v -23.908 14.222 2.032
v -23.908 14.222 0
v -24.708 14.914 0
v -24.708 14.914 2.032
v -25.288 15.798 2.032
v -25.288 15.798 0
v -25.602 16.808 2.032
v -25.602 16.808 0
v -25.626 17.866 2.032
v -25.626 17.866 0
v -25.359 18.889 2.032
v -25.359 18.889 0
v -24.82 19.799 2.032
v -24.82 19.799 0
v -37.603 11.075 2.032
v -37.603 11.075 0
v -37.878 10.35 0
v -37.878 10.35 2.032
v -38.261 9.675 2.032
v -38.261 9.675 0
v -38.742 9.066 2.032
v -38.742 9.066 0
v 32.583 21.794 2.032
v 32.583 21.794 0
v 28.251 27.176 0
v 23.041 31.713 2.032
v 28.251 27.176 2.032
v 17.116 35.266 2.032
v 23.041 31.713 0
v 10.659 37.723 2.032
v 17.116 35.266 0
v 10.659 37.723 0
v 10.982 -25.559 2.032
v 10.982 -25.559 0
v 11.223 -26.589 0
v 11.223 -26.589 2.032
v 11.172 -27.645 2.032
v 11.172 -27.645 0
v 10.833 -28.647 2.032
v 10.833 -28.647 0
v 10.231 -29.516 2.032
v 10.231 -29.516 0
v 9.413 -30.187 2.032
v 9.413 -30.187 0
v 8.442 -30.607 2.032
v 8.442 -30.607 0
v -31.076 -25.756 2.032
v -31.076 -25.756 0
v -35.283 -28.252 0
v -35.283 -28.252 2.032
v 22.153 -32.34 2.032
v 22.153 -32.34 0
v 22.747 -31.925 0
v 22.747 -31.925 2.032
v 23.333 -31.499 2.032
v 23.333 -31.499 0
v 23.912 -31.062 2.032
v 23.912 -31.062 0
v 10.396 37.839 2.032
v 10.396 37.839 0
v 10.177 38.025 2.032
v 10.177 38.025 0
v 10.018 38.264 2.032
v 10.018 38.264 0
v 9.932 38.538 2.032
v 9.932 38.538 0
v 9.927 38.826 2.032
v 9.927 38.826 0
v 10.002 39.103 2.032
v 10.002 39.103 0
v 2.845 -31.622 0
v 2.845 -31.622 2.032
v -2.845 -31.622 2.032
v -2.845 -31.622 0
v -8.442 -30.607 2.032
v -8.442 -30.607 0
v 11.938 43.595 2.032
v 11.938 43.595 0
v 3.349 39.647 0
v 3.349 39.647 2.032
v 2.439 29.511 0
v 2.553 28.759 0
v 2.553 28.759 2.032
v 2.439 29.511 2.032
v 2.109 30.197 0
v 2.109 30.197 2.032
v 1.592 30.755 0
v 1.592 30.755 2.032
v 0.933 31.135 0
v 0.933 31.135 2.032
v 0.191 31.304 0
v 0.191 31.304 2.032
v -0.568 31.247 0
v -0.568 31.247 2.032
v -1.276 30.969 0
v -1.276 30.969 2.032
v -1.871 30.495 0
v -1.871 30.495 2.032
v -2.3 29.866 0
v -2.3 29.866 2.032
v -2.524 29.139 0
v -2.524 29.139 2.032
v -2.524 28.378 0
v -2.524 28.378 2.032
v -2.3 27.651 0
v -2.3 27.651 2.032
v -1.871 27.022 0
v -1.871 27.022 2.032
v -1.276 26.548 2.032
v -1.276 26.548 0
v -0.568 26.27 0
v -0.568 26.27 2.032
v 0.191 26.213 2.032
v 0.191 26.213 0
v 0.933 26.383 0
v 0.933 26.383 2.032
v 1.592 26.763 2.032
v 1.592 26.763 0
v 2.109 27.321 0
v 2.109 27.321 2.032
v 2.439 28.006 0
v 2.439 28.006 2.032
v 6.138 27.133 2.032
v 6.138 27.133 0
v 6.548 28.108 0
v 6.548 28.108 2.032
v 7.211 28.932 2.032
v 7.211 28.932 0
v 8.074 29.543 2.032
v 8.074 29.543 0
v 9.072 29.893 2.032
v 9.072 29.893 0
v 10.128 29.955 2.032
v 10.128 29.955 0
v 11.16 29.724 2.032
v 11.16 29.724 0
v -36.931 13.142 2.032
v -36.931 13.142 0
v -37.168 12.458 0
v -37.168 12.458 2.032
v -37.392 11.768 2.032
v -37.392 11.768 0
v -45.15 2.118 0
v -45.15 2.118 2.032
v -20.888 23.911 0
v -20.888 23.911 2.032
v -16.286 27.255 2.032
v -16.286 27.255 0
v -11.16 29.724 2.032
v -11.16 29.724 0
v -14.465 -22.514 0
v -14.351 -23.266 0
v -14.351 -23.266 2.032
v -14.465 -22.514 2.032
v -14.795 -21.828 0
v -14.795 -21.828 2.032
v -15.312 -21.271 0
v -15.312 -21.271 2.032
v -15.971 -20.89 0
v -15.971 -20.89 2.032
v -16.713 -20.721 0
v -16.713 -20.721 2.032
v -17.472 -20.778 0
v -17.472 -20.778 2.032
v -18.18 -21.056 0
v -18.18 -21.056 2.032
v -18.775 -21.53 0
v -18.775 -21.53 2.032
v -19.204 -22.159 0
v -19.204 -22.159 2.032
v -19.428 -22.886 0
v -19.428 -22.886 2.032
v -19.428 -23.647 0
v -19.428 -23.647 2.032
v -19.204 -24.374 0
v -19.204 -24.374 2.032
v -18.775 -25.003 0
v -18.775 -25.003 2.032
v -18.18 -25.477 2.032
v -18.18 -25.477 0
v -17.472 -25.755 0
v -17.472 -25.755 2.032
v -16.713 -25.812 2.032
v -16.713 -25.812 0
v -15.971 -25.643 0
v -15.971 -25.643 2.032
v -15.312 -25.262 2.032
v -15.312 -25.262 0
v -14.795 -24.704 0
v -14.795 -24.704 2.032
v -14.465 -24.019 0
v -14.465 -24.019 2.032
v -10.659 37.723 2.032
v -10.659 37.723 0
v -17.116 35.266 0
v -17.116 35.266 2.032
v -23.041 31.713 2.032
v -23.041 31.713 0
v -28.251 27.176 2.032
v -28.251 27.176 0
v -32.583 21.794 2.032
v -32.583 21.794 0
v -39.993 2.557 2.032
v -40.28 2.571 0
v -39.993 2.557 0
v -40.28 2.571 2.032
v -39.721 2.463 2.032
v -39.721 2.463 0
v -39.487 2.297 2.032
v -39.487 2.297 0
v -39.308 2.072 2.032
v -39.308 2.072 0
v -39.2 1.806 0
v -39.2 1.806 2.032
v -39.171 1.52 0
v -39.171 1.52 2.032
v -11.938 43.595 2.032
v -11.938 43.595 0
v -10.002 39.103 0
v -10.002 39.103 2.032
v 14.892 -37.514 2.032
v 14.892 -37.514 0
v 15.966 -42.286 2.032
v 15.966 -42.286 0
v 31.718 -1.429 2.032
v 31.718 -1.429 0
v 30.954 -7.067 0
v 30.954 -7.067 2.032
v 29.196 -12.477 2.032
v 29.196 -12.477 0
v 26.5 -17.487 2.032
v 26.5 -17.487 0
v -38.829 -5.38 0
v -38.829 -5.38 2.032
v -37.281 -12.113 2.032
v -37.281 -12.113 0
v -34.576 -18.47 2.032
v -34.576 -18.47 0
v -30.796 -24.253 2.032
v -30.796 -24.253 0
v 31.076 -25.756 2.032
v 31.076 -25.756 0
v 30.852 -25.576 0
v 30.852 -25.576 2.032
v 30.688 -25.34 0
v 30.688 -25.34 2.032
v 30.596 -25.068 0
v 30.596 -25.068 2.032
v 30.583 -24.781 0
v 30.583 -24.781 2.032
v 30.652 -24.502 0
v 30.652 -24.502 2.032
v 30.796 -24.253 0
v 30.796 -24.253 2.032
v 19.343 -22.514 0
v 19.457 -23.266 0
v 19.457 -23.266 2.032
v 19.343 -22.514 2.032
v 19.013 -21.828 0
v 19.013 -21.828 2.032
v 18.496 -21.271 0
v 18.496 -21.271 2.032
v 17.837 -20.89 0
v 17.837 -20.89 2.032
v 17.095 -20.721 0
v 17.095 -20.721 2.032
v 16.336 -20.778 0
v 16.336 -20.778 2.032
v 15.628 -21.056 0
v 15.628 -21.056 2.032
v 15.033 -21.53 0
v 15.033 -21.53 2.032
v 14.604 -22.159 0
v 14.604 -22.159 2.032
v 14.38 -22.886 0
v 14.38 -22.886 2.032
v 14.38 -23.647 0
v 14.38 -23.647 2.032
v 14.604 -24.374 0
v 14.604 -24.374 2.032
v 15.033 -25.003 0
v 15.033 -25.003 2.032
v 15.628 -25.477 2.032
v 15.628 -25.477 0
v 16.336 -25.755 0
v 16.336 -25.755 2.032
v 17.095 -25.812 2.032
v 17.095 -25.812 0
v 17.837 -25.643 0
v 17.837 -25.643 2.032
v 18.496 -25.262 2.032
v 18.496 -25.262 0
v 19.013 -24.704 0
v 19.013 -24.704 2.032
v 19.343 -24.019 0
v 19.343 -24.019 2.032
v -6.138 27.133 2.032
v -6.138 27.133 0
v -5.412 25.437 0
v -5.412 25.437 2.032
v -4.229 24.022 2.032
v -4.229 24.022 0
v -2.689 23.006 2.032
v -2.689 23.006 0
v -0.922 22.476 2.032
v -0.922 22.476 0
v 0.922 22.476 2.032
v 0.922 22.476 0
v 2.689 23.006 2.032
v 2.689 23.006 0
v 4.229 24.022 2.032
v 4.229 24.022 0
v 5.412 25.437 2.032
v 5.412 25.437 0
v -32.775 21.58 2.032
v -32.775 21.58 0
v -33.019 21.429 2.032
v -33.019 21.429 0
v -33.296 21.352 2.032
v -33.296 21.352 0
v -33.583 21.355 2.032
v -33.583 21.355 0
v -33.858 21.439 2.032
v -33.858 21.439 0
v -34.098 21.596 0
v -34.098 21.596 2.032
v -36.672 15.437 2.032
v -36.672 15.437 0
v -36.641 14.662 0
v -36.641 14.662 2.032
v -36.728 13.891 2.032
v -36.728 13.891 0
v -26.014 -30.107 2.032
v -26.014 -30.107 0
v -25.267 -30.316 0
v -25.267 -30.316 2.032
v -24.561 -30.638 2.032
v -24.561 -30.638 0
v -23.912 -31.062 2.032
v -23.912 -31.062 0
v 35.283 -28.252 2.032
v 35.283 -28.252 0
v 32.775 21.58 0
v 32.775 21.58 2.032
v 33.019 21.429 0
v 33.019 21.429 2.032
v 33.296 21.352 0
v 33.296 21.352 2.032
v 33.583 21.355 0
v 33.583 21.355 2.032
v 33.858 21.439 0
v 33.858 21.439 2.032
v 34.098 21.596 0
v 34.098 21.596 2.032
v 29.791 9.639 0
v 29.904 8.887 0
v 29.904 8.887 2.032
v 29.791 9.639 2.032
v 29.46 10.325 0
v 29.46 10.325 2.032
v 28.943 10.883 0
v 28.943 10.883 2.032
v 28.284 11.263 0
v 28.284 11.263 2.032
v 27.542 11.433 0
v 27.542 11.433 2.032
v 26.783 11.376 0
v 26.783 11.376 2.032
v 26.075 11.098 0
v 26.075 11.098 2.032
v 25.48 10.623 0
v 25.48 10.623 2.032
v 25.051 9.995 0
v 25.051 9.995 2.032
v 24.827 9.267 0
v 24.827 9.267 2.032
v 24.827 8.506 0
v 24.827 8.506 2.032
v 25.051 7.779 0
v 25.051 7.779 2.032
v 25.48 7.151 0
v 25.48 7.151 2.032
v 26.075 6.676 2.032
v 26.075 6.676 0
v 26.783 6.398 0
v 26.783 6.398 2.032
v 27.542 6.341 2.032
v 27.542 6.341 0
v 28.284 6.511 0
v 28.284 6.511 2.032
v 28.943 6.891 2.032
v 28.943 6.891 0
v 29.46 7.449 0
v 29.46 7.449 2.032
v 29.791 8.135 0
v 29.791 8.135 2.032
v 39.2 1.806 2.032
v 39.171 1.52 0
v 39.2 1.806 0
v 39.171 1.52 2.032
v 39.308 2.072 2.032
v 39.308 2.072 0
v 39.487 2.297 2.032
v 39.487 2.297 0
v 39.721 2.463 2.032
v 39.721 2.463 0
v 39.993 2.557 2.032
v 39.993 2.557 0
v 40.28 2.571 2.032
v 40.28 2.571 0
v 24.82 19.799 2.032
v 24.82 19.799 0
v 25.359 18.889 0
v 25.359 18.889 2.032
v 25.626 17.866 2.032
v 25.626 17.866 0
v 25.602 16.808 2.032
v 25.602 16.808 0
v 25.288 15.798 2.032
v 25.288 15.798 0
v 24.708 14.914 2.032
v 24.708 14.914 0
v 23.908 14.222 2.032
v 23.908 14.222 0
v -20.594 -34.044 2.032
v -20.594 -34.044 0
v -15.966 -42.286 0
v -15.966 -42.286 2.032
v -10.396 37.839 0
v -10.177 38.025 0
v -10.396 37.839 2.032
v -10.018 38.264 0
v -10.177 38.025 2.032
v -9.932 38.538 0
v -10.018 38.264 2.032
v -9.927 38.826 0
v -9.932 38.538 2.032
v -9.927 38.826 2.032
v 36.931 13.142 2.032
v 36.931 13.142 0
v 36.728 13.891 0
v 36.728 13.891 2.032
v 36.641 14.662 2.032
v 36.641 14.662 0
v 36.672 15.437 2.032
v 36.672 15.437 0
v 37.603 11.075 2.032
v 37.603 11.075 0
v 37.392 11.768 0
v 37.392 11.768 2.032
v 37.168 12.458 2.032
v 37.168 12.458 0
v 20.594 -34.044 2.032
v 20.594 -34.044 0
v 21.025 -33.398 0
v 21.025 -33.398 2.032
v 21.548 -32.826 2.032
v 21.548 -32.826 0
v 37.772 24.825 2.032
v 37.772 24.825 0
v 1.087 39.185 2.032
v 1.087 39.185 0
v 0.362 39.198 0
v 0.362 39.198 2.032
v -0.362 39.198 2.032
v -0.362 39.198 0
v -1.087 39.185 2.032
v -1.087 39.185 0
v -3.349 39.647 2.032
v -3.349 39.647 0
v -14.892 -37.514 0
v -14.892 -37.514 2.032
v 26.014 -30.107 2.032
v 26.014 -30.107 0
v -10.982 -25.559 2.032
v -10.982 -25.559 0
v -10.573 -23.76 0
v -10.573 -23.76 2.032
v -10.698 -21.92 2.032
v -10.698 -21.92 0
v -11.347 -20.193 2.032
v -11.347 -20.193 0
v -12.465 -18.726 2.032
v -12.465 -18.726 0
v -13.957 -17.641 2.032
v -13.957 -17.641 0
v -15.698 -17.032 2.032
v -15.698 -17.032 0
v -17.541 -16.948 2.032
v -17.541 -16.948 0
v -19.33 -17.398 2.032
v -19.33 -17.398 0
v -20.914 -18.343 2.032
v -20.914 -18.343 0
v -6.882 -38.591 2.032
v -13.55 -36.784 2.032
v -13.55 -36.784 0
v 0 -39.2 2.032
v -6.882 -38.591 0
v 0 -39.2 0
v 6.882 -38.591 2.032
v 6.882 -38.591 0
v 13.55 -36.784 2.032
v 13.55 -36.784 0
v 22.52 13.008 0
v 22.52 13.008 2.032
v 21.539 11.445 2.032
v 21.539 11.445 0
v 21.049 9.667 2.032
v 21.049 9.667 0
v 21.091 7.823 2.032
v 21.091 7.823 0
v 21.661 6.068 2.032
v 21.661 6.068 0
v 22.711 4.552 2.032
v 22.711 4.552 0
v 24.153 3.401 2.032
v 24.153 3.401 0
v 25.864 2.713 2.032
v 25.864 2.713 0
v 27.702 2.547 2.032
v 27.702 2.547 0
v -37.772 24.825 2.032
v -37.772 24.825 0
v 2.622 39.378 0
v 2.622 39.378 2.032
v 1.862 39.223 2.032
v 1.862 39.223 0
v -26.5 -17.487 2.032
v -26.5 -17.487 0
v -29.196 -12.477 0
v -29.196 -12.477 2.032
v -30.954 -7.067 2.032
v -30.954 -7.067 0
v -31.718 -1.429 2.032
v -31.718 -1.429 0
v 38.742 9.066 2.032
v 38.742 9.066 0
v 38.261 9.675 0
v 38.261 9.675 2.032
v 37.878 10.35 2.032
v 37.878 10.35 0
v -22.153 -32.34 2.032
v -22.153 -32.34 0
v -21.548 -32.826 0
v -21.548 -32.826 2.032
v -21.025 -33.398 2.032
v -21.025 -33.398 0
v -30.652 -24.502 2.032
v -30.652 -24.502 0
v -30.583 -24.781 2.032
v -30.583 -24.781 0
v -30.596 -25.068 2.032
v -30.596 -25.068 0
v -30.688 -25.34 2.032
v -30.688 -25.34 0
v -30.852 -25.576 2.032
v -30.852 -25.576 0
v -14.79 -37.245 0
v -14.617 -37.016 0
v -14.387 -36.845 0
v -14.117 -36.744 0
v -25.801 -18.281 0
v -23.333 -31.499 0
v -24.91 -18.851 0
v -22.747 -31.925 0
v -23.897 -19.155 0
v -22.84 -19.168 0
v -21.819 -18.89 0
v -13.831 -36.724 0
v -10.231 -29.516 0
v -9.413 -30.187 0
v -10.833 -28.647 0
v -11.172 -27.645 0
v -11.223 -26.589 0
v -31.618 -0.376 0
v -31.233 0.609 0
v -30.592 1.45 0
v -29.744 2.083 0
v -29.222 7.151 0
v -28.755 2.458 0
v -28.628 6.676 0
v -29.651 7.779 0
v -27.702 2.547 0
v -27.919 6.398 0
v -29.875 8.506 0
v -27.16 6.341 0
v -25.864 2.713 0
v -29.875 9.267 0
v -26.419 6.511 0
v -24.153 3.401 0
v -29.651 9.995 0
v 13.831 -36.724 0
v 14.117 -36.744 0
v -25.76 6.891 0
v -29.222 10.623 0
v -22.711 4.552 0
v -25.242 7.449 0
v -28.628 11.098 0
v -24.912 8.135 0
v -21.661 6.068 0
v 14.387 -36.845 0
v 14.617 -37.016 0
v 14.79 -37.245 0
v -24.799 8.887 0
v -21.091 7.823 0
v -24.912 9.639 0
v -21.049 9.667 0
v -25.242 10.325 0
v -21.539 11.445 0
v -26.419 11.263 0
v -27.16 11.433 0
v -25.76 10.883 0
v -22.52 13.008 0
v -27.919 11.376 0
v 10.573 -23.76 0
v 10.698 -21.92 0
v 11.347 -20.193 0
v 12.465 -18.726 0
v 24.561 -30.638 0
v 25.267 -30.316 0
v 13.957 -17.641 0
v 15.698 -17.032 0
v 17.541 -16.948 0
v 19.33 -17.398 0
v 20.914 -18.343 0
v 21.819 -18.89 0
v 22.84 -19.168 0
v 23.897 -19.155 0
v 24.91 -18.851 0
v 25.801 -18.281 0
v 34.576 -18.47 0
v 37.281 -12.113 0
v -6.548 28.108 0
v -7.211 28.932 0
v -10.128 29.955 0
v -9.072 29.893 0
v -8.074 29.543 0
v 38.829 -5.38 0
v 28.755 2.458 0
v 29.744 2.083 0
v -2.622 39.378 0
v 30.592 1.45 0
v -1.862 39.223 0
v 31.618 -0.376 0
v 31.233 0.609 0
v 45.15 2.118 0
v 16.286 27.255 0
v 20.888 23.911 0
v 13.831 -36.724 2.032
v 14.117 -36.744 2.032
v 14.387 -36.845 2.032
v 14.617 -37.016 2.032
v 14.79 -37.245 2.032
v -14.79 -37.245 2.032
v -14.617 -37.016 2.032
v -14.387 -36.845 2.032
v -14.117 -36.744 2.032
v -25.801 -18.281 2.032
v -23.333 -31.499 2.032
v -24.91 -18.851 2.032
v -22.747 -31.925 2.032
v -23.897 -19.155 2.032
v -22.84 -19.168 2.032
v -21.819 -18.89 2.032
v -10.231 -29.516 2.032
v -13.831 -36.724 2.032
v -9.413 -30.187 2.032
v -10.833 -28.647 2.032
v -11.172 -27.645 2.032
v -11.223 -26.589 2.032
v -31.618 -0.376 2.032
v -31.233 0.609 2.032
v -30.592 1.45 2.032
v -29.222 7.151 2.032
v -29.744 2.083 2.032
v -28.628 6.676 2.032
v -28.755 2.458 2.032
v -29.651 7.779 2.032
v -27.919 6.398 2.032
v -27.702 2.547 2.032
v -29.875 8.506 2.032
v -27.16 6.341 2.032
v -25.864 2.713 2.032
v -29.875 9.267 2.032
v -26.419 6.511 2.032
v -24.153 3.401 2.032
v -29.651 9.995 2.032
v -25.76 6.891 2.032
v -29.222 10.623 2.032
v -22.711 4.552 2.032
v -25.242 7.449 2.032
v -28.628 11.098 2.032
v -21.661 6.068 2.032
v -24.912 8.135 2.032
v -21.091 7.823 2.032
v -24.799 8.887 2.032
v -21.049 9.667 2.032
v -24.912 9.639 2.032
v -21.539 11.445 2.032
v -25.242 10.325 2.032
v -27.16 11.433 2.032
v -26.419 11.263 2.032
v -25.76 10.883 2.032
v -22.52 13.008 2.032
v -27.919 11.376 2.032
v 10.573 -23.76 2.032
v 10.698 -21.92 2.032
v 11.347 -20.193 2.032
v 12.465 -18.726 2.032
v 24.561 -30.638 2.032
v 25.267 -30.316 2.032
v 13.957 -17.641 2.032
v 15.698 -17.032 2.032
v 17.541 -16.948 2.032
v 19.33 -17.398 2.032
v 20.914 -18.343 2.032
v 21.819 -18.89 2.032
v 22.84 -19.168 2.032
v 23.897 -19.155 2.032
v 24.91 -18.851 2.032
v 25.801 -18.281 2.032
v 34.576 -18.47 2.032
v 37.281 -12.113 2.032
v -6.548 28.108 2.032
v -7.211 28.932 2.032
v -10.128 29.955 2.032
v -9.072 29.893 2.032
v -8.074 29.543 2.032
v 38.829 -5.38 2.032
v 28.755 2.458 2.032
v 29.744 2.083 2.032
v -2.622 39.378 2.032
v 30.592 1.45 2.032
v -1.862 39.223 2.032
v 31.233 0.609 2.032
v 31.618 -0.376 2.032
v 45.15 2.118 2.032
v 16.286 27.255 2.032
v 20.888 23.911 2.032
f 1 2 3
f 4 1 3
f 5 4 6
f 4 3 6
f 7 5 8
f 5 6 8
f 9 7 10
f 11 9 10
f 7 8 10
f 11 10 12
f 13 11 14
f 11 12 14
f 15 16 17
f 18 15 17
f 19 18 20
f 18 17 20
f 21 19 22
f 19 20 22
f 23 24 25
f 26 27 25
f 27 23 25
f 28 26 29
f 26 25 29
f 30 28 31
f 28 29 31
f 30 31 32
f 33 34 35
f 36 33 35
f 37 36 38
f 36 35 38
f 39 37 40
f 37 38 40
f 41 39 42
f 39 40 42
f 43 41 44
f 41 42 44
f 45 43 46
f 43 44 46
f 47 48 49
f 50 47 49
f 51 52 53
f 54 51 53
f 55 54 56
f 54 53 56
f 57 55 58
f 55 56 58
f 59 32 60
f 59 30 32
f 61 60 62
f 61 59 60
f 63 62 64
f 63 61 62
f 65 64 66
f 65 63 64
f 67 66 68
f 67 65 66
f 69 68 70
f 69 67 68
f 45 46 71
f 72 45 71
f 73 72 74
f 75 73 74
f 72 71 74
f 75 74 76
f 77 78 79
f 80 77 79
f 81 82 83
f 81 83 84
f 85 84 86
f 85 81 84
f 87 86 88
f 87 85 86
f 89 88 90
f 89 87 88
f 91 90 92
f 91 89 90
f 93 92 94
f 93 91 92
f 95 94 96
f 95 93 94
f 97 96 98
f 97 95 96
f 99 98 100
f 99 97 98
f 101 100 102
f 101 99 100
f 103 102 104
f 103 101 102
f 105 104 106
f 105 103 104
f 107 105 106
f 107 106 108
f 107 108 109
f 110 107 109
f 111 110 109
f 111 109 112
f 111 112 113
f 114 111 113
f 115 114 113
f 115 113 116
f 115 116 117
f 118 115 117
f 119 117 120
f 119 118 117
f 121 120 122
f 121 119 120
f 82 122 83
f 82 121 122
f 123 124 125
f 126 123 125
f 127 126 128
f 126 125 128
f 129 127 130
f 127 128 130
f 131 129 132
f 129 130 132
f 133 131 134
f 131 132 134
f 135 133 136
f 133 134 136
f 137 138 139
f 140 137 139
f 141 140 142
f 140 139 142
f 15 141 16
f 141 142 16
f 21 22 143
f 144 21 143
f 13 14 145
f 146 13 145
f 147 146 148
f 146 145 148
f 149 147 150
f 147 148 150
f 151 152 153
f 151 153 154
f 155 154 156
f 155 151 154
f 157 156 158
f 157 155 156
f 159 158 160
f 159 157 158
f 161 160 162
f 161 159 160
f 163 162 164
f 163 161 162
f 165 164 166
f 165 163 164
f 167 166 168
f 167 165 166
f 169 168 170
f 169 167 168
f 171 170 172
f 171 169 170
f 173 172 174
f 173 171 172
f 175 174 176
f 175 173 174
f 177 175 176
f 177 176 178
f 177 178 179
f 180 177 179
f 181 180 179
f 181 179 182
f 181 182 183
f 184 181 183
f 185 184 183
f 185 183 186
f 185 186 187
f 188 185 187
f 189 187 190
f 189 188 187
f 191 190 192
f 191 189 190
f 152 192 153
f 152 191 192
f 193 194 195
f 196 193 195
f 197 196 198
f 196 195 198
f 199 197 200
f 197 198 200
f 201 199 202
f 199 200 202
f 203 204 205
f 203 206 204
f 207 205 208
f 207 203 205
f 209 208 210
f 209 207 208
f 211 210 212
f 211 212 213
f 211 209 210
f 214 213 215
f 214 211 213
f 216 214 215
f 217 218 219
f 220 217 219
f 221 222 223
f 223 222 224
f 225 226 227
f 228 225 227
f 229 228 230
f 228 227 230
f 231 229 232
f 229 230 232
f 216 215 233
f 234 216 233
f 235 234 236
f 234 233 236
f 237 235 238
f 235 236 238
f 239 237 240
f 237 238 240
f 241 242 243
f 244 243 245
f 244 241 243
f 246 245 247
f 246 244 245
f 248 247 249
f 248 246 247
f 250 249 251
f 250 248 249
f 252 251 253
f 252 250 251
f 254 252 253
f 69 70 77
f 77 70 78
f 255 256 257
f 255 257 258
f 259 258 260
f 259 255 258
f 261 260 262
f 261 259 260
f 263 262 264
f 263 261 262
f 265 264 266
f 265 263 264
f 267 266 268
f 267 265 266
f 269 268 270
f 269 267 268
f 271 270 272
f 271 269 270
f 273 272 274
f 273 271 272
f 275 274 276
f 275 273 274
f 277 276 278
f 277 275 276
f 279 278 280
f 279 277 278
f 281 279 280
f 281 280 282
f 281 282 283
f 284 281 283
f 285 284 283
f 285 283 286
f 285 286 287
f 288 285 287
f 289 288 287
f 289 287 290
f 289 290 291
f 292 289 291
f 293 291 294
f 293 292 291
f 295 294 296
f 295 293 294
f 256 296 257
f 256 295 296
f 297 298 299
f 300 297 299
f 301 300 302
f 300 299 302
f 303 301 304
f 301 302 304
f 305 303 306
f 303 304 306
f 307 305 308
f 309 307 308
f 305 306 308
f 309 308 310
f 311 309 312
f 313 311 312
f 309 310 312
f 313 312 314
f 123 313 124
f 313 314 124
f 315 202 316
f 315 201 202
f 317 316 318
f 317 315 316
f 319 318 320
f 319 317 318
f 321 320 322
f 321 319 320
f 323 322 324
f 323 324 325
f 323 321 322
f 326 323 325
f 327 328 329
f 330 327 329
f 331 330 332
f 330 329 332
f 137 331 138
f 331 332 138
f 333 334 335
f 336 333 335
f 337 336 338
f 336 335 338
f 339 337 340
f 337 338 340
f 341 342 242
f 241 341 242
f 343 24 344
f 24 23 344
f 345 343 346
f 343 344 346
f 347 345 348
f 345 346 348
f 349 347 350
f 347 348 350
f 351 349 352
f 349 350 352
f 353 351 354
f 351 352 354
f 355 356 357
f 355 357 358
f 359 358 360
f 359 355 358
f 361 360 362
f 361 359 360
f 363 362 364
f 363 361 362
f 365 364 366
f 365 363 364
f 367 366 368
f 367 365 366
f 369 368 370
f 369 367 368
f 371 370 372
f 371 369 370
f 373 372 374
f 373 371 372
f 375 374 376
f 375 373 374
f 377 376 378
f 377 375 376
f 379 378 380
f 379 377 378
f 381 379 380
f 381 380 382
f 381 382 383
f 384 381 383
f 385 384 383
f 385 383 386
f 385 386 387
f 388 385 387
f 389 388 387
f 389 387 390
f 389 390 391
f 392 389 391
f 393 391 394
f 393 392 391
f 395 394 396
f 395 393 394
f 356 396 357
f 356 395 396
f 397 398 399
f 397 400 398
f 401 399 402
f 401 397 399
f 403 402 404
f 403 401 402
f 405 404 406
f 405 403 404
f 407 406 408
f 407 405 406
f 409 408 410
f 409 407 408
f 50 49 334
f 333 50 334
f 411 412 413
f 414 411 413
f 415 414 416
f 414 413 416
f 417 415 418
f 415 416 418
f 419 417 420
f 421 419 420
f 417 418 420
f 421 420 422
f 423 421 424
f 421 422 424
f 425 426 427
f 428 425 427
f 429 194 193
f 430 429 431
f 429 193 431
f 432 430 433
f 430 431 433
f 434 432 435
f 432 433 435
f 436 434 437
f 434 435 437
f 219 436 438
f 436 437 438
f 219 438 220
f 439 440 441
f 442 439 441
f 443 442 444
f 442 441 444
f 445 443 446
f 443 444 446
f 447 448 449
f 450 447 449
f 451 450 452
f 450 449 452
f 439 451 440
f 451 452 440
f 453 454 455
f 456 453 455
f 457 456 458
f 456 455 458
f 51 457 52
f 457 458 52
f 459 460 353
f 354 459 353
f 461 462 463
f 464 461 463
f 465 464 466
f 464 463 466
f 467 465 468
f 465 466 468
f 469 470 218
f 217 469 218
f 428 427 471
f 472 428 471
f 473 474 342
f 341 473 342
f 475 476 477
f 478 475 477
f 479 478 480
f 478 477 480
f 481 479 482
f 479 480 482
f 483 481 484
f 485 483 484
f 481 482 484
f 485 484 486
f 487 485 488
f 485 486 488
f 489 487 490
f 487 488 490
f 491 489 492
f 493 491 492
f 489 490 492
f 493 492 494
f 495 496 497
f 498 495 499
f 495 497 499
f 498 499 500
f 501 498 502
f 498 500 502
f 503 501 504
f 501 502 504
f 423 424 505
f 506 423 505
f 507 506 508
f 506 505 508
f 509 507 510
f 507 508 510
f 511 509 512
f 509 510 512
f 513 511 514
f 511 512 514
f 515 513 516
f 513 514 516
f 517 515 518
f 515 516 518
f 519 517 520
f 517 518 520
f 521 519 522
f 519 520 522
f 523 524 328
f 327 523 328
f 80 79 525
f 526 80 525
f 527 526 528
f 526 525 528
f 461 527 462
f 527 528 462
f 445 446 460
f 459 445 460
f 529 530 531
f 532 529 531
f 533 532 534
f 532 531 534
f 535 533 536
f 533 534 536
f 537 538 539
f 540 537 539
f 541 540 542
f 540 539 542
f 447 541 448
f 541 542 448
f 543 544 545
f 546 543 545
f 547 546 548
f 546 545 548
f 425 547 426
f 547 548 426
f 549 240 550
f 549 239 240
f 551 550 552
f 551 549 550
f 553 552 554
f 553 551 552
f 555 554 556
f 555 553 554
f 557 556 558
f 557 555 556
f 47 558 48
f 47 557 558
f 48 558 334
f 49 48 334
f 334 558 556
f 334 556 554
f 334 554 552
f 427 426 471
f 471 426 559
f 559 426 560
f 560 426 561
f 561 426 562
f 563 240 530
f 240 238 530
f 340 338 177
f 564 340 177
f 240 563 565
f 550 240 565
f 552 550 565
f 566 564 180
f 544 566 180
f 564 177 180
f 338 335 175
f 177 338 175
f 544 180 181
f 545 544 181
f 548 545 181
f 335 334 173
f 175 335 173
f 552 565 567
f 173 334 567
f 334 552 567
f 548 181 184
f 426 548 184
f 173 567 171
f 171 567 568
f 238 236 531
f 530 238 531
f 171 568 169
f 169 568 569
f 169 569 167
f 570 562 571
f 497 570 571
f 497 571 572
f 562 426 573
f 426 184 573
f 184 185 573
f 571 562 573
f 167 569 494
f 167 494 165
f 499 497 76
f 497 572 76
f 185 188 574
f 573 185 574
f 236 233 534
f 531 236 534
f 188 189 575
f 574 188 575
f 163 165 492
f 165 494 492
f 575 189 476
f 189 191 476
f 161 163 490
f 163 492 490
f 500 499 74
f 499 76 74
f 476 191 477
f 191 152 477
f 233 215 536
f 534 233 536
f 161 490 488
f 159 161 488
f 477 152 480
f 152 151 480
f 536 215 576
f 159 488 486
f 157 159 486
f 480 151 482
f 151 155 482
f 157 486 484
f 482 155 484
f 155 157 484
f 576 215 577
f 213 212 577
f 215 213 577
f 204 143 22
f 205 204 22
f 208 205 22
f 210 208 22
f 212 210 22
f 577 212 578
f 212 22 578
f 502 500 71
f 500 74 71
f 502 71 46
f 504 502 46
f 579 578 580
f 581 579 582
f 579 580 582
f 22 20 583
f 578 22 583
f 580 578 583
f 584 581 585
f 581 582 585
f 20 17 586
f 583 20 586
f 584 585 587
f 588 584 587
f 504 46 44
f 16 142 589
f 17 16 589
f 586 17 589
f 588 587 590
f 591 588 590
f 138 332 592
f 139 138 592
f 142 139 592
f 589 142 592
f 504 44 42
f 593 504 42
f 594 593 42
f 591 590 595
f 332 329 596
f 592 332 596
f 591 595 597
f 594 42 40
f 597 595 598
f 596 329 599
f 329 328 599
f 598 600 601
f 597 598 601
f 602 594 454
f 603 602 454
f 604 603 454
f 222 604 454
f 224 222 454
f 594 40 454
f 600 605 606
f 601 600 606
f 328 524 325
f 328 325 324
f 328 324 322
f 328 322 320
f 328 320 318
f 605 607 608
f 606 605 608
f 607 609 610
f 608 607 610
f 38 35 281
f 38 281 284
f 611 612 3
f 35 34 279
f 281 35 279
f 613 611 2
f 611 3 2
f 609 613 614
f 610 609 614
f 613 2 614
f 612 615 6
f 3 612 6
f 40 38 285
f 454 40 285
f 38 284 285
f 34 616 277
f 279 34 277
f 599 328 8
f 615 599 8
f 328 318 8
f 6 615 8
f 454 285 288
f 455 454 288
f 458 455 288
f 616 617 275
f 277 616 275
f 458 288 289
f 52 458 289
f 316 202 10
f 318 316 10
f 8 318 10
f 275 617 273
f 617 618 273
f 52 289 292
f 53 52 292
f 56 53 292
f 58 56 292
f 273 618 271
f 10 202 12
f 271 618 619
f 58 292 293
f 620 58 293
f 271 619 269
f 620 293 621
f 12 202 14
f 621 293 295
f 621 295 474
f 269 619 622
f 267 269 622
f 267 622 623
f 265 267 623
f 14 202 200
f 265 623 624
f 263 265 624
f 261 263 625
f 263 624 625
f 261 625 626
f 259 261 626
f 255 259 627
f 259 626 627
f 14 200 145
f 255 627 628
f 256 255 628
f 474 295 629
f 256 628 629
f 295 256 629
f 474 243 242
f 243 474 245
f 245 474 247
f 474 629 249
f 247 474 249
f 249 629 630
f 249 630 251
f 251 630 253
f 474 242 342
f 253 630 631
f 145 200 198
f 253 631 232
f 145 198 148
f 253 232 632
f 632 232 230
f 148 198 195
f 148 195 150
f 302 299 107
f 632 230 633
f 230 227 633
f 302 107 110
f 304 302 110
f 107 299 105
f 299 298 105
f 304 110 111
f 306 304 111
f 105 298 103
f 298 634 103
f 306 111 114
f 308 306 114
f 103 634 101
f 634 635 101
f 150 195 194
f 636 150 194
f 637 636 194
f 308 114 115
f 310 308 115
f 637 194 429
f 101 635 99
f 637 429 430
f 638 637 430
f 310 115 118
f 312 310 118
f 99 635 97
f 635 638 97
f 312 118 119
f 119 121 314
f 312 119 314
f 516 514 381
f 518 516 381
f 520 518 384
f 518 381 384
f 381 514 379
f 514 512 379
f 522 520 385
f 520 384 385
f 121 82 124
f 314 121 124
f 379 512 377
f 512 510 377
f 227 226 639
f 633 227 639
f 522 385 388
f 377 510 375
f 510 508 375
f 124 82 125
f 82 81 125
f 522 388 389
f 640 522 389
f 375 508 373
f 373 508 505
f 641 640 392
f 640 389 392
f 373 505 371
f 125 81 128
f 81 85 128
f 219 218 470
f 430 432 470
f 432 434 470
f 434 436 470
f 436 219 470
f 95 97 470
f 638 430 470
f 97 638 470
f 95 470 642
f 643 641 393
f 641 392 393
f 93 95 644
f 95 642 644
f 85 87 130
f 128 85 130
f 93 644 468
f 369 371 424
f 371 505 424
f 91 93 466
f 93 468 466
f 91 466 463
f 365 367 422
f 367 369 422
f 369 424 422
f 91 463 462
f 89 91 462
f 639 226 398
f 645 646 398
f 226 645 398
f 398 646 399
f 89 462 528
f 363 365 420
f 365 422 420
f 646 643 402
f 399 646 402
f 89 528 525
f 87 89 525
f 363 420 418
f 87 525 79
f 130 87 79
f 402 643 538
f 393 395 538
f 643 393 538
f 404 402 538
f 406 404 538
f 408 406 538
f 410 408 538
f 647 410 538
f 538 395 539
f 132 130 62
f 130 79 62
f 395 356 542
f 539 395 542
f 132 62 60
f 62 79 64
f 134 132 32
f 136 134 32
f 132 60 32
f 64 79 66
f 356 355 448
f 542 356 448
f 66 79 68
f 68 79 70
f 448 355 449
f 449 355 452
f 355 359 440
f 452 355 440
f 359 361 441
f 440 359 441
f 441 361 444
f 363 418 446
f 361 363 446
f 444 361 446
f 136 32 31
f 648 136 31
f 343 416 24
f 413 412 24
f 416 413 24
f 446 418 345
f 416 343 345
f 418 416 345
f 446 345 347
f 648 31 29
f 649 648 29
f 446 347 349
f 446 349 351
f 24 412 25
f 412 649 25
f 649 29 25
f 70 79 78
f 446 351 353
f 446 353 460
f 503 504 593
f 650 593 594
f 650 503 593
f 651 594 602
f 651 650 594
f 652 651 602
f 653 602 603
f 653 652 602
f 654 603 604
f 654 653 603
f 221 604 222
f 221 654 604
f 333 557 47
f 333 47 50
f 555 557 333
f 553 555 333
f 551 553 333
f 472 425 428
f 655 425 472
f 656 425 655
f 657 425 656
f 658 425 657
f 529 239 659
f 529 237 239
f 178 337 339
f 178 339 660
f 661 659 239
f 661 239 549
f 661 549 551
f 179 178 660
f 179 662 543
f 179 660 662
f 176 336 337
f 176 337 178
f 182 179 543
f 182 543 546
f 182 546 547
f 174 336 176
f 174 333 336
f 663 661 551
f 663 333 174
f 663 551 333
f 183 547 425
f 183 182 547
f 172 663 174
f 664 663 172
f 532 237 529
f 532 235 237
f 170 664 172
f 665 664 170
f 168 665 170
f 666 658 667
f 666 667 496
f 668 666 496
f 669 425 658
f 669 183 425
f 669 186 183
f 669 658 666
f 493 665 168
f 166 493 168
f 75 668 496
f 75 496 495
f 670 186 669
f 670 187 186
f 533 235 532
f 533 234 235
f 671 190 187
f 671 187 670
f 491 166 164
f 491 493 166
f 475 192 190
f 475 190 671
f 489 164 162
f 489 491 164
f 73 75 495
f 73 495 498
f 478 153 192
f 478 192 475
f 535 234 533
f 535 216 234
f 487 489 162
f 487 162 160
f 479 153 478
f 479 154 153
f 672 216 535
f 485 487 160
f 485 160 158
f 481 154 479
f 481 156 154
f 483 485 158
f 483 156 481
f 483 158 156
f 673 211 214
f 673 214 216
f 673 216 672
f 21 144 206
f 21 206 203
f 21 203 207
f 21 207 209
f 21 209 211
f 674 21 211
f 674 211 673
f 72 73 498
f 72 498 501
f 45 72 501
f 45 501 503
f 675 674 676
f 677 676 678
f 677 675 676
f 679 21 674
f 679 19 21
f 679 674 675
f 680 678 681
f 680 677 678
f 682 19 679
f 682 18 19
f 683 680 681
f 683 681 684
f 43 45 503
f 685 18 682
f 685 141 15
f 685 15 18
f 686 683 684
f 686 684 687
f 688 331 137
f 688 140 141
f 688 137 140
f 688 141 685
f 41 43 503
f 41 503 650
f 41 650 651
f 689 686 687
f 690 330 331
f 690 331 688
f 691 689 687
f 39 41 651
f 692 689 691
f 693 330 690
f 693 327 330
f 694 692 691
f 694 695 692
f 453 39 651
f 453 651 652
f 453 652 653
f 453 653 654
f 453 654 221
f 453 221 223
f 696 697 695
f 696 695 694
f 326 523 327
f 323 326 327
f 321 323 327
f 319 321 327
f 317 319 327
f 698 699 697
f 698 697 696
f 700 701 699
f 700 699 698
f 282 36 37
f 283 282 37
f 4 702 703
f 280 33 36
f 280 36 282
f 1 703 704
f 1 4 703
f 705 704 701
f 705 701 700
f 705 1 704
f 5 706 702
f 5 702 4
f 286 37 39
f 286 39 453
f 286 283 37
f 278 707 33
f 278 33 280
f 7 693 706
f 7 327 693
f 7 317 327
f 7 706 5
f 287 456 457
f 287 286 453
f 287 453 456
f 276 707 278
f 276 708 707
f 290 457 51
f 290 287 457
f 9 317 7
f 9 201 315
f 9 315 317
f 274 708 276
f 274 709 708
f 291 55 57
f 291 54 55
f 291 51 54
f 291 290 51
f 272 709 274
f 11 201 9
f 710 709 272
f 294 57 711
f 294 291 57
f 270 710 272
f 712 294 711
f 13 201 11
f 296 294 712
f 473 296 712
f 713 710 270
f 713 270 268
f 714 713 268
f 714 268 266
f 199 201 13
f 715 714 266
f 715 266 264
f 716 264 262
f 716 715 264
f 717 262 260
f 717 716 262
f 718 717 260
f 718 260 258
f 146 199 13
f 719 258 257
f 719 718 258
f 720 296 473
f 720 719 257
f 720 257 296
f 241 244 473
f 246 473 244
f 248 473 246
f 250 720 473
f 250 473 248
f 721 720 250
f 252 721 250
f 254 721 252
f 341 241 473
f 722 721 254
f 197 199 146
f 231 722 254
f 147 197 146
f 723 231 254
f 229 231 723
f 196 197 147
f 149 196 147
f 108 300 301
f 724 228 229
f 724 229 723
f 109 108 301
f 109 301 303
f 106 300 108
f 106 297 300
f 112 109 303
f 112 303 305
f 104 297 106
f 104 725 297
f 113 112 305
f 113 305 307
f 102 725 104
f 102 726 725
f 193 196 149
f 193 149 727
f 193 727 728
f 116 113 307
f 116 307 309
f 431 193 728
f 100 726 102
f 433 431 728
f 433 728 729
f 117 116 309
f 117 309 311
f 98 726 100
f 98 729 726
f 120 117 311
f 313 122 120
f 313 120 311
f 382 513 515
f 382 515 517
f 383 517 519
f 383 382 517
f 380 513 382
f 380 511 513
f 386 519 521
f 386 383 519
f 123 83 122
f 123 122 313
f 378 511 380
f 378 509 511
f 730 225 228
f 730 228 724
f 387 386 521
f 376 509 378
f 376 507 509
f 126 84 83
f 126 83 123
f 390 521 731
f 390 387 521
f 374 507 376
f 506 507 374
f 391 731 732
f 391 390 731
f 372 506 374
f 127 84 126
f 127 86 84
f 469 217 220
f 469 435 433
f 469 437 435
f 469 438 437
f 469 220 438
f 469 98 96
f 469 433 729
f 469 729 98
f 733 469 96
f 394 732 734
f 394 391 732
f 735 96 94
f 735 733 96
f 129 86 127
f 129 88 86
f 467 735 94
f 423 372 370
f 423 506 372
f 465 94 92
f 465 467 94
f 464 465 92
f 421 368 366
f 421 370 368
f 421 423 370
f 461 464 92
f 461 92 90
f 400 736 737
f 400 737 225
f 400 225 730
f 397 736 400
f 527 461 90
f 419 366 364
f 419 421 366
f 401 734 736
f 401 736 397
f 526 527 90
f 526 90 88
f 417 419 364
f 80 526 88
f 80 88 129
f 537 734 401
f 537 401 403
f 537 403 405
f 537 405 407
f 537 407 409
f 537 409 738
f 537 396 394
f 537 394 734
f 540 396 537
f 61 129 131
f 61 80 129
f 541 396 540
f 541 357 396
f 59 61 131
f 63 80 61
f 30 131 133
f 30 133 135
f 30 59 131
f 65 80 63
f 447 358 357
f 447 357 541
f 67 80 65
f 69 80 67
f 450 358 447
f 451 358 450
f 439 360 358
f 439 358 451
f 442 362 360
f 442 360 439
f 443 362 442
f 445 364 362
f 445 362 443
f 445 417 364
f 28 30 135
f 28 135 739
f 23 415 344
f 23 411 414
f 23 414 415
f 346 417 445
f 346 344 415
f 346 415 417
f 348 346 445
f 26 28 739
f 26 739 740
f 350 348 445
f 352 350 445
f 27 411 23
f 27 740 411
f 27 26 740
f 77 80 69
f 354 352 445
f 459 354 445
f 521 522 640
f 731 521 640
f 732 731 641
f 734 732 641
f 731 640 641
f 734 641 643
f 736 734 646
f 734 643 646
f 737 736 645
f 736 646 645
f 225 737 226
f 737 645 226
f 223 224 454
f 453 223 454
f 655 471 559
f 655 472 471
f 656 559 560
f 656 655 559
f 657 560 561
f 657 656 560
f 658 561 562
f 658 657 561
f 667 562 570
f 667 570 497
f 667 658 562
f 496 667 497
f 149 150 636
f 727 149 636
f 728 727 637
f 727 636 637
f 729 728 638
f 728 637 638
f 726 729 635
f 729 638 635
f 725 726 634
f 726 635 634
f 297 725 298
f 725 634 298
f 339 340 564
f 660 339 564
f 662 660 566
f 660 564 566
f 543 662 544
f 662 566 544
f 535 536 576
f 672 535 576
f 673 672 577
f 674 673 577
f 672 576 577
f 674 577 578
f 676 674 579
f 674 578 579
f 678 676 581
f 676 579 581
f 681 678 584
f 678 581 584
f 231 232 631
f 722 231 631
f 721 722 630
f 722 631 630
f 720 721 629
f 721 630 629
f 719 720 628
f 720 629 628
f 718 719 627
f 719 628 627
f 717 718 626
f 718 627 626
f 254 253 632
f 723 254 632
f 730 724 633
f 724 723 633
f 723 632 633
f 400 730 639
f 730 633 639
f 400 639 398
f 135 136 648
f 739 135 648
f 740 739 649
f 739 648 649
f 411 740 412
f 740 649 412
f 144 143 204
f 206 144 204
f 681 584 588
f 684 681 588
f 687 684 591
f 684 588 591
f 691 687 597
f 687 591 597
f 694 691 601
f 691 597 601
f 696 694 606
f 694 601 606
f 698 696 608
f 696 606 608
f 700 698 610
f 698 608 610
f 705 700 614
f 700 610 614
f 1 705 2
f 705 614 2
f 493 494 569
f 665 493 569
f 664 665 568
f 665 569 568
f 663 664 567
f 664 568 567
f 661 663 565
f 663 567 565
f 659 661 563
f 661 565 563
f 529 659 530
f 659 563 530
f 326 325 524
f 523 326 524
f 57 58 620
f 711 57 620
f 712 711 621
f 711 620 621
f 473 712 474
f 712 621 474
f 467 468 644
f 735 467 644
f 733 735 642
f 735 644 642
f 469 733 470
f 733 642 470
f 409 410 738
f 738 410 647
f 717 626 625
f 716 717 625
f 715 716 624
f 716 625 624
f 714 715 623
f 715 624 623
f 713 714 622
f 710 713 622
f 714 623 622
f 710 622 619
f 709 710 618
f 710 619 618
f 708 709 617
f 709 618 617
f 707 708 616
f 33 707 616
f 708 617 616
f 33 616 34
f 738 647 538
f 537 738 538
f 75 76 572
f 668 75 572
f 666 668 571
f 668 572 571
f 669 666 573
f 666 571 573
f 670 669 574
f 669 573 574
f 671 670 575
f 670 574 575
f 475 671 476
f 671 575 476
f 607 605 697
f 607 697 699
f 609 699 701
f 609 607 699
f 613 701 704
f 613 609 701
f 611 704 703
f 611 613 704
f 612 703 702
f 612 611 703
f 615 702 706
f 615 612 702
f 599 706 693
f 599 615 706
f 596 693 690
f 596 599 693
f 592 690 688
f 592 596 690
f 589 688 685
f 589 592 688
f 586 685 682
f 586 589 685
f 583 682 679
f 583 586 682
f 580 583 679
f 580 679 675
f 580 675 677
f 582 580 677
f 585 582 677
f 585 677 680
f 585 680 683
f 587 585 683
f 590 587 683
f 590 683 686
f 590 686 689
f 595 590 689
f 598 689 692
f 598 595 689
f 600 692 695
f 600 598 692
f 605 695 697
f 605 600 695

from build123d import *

# Parameters (mm, degrees)
SKETCH1_R                = 39.2
SKETCH1_R_2              = 2.5527
BOSS_EXTRUDE1_DEPTH      = 2.032
BOSS_EXTRUDE5_DEPTH      = 2.032
FILLET2_R                = 1.016
CIRPATTERN2_COUNT        = 5
FILLET2_OF_CIRPATTERN2_R = 1.016


with BuildPart() as part:
    # Sketch1 → Boss-Extrude1 (new body)
    with BuildSketch(Plane.XY):
        Circle(SKETCH1_R)
        with BuildLine():
            ThreePointArc((24.820271985, 19.799409047), (25.601853519, 16.808343049), (23.907855902, 14.222280874))
            ThreePointArc((23.907855902, 14.222280874), (21.312007949, 6.924691149), (27.701508676, 2.546618187))
            ThreePointArc((27.701508676, 2.546618187), (30.592030744, 1.450156756), (31.717822482, -1.429068567))
            ThreePointArc((31.717822482, -1.429068567), (30.196044392, -9.811289571), (26.500242841, -17.487127533))
            ThreePointArc((26.500242841, -17.487127533), (23.89709201, -19.154745969), (20.914126675, -18.342795657))
            ThreePointArc((20.914126675, -18.342795657), (13.171545281, -18.12907679), (10.982214772, -25.558752039))
            ThreePointArc((10.982214772, -25.558752039), (10.832638425, -28.646627104), (8.442221199, -30.607048228))
            ThreePointArc((8.442221199, -30.607048228), (0, -31.75), (-8.442221199, -30.607048228))
            ThreePointArc((-8.442221199, -30.607048228), (-10.832638425, -28.646627104), (-10.982214772, -25.558752039))
            ThreePointArc((-10.982214772, -25.558752039), (-13.171545281, -18.12907679), (-20.914126675, -18.342795657))
            ThreePointArc((-20.914126675, -18.342795657), (-23.89709201, -19.154745969), (-26.500242841, -17.487127533))
            ThreePointArc((-26.500242841, -17.487127533), (-30.196044392, -9.811289571), (-31.717822482, -1.429068567))
            ThreePointArc((-31.717822482, -1.429068567), (-30.592030744, 1.450156756), (-27.701508676, 2.546618187))
            ThreePointArc((-27.701508676, 2.546618187), (-21.312007949, 6.924691149), (-23.907855902, 14.222280874))
            ThreePointArc((-23.907855902, 14.222280874), (-25.601853519, 16.808343049), (-24.820271985, 19.799409047))
            ThreePointArc((-24.820271985, 19.799409047), (-18.66218176, 25.686289571), (-11.160471144, 29.723835281))
            ThreePointArc((-11.160471144, 29.723835281), (-8.07427636, 29.542873268), (-6.138259129, 27.132648635))
            ThreePointArc((-6.138259129, 27.132648635), (0, 22.408771281), (6.138259129, 27.132648635))
            ThreePointArc((6.138259129, 27.132648635), (8.07427636, 29.542873268), (11.160471144, 29.723835281))
            ThreePointArc((11.160471144, 29.723835281), (18.66218176, 25.686289571), (24.820271985, 19.799409047))
        make_face(mode=Mode.SUBTRACT)
        with Locations((27.351216828, 8.886949063)):
            Circle(SKETCH1_R_2, mode=Mode.SUBTRACT)
        with Locations((0, 28.758771281)):
            Circle(SKETCH1_R_2, mode=Mode.SUBTRACT)
        with Locations((16.903981633, -23.266334704)):
            Circle(SKETCH1_R_2, mode=Mode.SUBTRACT)
        with Locations((-27.351216828, 8.886949063)):
            Circle(SKETCH1_R_2, mode=Mode.SUBTRACT)
        with Locations((-16.903981633, -23.266334704)):
            Circle(SKETCH1_R_2, mode=Mode.SUBTRACT)
    extrude(amount=BOSS_EXTRUDE1_DEPTH)

    # Sketch1<5> → Boss-Extrude5 (add)
    with BuildSketch(Plane.XY):
        with BuildLine():
            Line((-11.938, 43.595001502), (-9.536371101, 38.022330626))
            ThreePointArc((-9.536371101, 38.022330626), (-5.343297764, 38.83412377), (-1.086796161, 39.184931723))
            ThreePointArc((-1.086796161, 39.184931723), (-2.244635615, 39.285819975), (-3.349242804, 39.647225009))
            Line((-3.349242804, 39.647225009), (-11.938, 43.595001502))
        make_face()
        with BuildLine():
            ThreePointArc((3.349242804, 39.647225009), (2.244635615, 39.285819975), (1.086796161, 39.184931723))
            ThreePointArc((1.086796161, 39.184931723), (5.343297764, 38.83412377), (9.536371101, 38.022330626))
            Line((9.536371101, 38.022330626), (11.938, 43.595001502))
            Line((11.938, 43.595001502), (3.349242804, 39.647225009))
        make_face()
    boss_extrude5 = extrude(amount=BOSS_EXTRUDE5_DEPTH)

    # Fillet2
    fillet2_edges = [part.edges().sort_by_distance(p)[0] for p in [
        (-9.536371101, 38.022330626, 1.016),
        (9.536371101, 38.022330626, 1.016),
    ]]
    fillet(fillet2_edges, radius=FILLET2_R)

    # CirPattern2: Boss-Extrude5 ×5 about axis
    cirpattern2_axis = Axis((0, 0, 0), (0, 0, 1))
    for i in range(1, CIRPATTERN2_COUNT):
        add(boss_extrude5.rotate(cirpattern2_axis, i * 360 / CIRPATTERN2_COUNT))

    # Fillet2 of CirPattern2
    fillet2_of_cirpattern2_edges = [part.edges().sort_by_distance(p)[0] for p in [
        (-39.108286041, 2.679918452, 1.016),
        (-33.214484572, 20.819174207, 1.016),
        (-14.633878914, -36.366049936, 1.016),
        (-30.064051485, -25.155373348, 1.016),
        (30.064051485, -25.155373348, 1.016),
        (14.633878914, -36.366049936, 1.016),
        (33.214484572, 20.819174207, 1.016),
        (39.108286041, 2.679918452, 1.016),
    ]]
    fillet(fillet2_of_cirpattern2_edges, radius=FILLET2_OF_CIRPATTERN2_R)


solid = part.part
